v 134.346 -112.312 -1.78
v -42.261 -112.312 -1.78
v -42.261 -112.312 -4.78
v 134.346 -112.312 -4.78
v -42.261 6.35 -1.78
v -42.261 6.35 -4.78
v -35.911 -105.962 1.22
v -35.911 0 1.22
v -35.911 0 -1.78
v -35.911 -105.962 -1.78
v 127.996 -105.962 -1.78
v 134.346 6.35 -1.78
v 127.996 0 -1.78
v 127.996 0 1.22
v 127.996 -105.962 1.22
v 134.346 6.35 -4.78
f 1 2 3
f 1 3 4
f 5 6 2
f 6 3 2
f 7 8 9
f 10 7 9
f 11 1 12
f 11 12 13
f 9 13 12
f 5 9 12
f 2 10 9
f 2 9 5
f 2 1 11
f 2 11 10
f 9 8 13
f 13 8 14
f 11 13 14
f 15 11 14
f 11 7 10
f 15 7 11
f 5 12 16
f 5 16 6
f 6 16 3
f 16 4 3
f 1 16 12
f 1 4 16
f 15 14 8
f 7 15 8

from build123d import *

# Parameters (mm, degrees)
F2_DEPTH = 105.9625
F3_W     = 176.60625
F3_H     = 3
F4_DEPTH = 6.35
F5_W     = 176.60625
F5_H     = 3
F6_DEPTH = 6.35


# Not quite as in the source:
# - a length typed as a fraction of an inch, garbled in the dataset ("3 / 203.2 mm" for 3/8 in), is restored


with BuildPart() as f2:
    # F1 (on Front) → F2 (new body)
    with BuildSketch(Plane.XZ):
        Polygon((-42.2606132925, -1.7798869123), (-42.2606132925, -4.7798869123), (134.3456367075, -4.7798869123), (134.3456367075, -1.7798869123), (127.9956367075, -1.7798869123), (127.9956367075, 1.2201130877), (-35.9106132925, 1.2201130877), (-35.9106132925, -1.7798869123), align=None)
    extrude(amount=F2_DEPTH)

    # F3 (on face) → F4 (join)
    with BuildSketch(Plane.XZ.offset(105.9625)):
        with Locations((46.0425117075, -3.2798869123)):
            Rectangle(F3_W, F3_H)
    extrude(amount=F4_DEPTH)

    # F5 (on face) → F6 (join)
    with BuildSketch(Plane(origin=(0, 0, 0), x_dir=(-1, 0, 0), z_dir=(0, 1, 0))):
        with Locations((-46.0425117075, -3.2798869123)):
            Rectangle(F5_W, F5_H)
    extrude(amount=F6_DEPTH)


solid = f2.part
